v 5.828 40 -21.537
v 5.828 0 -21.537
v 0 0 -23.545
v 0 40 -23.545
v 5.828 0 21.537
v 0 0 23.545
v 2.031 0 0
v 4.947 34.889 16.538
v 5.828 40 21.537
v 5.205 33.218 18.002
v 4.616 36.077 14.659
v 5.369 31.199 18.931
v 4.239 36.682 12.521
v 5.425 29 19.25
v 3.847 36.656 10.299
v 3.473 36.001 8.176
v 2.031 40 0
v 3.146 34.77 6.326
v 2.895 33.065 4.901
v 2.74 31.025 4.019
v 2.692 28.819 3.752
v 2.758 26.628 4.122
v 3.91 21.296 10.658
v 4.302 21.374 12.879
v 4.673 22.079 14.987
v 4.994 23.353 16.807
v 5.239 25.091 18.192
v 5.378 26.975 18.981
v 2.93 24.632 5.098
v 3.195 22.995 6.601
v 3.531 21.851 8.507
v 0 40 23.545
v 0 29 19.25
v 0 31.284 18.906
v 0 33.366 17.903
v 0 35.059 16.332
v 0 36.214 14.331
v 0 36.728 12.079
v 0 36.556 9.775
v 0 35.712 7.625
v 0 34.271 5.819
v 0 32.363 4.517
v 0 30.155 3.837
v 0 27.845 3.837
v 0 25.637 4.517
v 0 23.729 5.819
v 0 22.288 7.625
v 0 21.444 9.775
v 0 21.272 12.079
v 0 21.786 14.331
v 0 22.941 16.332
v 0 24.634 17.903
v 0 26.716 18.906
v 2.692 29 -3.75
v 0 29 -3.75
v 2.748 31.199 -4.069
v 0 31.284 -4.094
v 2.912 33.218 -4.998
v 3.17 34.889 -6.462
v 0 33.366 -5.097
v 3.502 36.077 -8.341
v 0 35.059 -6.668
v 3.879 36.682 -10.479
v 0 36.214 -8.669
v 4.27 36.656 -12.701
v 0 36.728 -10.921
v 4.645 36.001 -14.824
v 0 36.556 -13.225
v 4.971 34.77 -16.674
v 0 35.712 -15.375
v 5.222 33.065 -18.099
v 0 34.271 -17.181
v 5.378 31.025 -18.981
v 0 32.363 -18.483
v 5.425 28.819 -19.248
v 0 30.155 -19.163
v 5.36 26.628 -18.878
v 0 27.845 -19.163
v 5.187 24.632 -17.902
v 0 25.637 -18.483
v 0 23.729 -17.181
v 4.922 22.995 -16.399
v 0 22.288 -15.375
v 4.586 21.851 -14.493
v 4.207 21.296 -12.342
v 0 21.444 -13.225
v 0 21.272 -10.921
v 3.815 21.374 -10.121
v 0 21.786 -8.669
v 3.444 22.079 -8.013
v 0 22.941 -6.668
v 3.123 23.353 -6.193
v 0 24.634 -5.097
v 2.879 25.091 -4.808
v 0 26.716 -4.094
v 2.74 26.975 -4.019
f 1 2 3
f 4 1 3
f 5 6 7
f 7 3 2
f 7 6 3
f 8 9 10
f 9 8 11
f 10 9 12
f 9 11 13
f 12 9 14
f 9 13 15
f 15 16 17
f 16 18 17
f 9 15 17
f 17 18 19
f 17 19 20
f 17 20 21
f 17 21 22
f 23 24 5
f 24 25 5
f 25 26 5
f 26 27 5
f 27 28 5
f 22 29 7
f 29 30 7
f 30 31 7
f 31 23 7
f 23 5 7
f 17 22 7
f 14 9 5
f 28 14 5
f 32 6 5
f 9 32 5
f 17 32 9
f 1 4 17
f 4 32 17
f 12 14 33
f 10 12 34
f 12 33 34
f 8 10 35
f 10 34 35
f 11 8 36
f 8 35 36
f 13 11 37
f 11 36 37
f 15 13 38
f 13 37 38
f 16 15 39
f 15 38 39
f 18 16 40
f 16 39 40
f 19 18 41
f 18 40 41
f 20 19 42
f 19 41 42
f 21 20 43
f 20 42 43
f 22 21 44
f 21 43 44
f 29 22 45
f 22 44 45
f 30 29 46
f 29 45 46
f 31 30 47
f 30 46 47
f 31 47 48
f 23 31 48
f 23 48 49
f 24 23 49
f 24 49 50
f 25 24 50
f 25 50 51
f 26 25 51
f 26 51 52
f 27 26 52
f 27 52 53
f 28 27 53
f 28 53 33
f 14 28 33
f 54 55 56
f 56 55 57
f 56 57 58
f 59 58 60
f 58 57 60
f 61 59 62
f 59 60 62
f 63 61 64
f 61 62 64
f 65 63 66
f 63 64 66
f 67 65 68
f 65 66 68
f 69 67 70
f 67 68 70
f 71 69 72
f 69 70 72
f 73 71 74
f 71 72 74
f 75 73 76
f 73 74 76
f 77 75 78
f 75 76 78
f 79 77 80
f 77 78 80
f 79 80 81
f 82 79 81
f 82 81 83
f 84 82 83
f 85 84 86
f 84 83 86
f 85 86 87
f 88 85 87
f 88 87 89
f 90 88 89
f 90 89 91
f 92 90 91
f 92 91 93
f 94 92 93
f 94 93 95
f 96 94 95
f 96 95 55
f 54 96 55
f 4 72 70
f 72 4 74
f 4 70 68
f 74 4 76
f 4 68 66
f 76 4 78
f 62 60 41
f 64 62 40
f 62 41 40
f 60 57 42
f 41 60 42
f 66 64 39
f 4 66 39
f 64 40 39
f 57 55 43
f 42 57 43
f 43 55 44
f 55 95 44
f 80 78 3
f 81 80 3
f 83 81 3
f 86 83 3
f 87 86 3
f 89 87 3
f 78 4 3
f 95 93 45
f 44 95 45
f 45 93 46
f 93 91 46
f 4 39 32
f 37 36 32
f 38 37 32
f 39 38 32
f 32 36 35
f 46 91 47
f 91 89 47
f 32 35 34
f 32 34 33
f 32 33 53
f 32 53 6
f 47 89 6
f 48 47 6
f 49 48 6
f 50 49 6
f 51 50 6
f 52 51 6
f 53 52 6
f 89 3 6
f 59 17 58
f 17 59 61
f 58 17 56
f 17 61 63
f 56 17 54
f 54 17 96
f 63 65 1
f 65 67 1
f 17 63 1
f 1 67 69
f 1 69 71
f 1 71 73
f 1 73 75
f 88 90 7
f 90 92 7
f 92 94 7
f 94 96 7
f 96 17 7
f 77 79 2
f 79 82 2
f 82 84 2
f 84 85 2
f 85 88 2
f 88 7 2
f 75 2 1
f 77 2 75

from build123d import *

# Parameters (mm, degrees)
BOSS_EXTRUDE2_DEPTH = 40
CUT_EXTRUDE1_REACH  = 48.78
SKETCH4_R           = 7.75


with BuildPart() as part:
    # Sketch3 → Boss-Extrude2 (new body)
    with BuildSketch(Plane(origin=(0, 0, 0), x_dir=(1, 0, 0), z_dir=(0, 1, 0))):
        Polygon((0, -23.54499856), (5.828357437, -21.536716606), (2.030853224, 0), (5.828357437, 21.536716606), (0, 23.54499856), align=None)
    extrude(amount=BOSS_EXTRUDE2_DEPTH)

    # Sketch4 → Cut-Extrude1 (cut, up to next)
    with BuildSketch(Plane.ZY, mode=Mode.PRIVATE) as cut_extrude1_sk1:
        with Locations((-11.5, 29)):
            Circle(SKETCH4_R)
    cut_extrude1_tool1 = extrude(cut_extrude1_sk1.sketch, amount=-CUT_EXTRUDE1_REACH, mode=Mode.PRIVATE) & part.part
    # Sketch4 → Cut-Extrude1 (cut, up to next)
    with BuildSketch(Plane.ZY, mode=Mode.PRIVATE) as cut_extrude1_sk2:
        with Locations((11.5, 29)):
            Circle(SKETCH4_R)
    cut_extrude1_tool2 = extrude(cut_extrude1_sk2.sketch, amount=-CUT_EXTRUDE1_REACH, mode=Mode.PRIVATE) & part.part
    add(cut_extrude1_tool1.solids().sort_by_distance((0, 29, -11.5))[0], mode=Mode.SUBTRACT)
    add(cut_extrude1_tool2.solids().sort_by_distance((0, 29, 11.5))[0], mode=Mode.SUBTRACT)


solid = part.part
